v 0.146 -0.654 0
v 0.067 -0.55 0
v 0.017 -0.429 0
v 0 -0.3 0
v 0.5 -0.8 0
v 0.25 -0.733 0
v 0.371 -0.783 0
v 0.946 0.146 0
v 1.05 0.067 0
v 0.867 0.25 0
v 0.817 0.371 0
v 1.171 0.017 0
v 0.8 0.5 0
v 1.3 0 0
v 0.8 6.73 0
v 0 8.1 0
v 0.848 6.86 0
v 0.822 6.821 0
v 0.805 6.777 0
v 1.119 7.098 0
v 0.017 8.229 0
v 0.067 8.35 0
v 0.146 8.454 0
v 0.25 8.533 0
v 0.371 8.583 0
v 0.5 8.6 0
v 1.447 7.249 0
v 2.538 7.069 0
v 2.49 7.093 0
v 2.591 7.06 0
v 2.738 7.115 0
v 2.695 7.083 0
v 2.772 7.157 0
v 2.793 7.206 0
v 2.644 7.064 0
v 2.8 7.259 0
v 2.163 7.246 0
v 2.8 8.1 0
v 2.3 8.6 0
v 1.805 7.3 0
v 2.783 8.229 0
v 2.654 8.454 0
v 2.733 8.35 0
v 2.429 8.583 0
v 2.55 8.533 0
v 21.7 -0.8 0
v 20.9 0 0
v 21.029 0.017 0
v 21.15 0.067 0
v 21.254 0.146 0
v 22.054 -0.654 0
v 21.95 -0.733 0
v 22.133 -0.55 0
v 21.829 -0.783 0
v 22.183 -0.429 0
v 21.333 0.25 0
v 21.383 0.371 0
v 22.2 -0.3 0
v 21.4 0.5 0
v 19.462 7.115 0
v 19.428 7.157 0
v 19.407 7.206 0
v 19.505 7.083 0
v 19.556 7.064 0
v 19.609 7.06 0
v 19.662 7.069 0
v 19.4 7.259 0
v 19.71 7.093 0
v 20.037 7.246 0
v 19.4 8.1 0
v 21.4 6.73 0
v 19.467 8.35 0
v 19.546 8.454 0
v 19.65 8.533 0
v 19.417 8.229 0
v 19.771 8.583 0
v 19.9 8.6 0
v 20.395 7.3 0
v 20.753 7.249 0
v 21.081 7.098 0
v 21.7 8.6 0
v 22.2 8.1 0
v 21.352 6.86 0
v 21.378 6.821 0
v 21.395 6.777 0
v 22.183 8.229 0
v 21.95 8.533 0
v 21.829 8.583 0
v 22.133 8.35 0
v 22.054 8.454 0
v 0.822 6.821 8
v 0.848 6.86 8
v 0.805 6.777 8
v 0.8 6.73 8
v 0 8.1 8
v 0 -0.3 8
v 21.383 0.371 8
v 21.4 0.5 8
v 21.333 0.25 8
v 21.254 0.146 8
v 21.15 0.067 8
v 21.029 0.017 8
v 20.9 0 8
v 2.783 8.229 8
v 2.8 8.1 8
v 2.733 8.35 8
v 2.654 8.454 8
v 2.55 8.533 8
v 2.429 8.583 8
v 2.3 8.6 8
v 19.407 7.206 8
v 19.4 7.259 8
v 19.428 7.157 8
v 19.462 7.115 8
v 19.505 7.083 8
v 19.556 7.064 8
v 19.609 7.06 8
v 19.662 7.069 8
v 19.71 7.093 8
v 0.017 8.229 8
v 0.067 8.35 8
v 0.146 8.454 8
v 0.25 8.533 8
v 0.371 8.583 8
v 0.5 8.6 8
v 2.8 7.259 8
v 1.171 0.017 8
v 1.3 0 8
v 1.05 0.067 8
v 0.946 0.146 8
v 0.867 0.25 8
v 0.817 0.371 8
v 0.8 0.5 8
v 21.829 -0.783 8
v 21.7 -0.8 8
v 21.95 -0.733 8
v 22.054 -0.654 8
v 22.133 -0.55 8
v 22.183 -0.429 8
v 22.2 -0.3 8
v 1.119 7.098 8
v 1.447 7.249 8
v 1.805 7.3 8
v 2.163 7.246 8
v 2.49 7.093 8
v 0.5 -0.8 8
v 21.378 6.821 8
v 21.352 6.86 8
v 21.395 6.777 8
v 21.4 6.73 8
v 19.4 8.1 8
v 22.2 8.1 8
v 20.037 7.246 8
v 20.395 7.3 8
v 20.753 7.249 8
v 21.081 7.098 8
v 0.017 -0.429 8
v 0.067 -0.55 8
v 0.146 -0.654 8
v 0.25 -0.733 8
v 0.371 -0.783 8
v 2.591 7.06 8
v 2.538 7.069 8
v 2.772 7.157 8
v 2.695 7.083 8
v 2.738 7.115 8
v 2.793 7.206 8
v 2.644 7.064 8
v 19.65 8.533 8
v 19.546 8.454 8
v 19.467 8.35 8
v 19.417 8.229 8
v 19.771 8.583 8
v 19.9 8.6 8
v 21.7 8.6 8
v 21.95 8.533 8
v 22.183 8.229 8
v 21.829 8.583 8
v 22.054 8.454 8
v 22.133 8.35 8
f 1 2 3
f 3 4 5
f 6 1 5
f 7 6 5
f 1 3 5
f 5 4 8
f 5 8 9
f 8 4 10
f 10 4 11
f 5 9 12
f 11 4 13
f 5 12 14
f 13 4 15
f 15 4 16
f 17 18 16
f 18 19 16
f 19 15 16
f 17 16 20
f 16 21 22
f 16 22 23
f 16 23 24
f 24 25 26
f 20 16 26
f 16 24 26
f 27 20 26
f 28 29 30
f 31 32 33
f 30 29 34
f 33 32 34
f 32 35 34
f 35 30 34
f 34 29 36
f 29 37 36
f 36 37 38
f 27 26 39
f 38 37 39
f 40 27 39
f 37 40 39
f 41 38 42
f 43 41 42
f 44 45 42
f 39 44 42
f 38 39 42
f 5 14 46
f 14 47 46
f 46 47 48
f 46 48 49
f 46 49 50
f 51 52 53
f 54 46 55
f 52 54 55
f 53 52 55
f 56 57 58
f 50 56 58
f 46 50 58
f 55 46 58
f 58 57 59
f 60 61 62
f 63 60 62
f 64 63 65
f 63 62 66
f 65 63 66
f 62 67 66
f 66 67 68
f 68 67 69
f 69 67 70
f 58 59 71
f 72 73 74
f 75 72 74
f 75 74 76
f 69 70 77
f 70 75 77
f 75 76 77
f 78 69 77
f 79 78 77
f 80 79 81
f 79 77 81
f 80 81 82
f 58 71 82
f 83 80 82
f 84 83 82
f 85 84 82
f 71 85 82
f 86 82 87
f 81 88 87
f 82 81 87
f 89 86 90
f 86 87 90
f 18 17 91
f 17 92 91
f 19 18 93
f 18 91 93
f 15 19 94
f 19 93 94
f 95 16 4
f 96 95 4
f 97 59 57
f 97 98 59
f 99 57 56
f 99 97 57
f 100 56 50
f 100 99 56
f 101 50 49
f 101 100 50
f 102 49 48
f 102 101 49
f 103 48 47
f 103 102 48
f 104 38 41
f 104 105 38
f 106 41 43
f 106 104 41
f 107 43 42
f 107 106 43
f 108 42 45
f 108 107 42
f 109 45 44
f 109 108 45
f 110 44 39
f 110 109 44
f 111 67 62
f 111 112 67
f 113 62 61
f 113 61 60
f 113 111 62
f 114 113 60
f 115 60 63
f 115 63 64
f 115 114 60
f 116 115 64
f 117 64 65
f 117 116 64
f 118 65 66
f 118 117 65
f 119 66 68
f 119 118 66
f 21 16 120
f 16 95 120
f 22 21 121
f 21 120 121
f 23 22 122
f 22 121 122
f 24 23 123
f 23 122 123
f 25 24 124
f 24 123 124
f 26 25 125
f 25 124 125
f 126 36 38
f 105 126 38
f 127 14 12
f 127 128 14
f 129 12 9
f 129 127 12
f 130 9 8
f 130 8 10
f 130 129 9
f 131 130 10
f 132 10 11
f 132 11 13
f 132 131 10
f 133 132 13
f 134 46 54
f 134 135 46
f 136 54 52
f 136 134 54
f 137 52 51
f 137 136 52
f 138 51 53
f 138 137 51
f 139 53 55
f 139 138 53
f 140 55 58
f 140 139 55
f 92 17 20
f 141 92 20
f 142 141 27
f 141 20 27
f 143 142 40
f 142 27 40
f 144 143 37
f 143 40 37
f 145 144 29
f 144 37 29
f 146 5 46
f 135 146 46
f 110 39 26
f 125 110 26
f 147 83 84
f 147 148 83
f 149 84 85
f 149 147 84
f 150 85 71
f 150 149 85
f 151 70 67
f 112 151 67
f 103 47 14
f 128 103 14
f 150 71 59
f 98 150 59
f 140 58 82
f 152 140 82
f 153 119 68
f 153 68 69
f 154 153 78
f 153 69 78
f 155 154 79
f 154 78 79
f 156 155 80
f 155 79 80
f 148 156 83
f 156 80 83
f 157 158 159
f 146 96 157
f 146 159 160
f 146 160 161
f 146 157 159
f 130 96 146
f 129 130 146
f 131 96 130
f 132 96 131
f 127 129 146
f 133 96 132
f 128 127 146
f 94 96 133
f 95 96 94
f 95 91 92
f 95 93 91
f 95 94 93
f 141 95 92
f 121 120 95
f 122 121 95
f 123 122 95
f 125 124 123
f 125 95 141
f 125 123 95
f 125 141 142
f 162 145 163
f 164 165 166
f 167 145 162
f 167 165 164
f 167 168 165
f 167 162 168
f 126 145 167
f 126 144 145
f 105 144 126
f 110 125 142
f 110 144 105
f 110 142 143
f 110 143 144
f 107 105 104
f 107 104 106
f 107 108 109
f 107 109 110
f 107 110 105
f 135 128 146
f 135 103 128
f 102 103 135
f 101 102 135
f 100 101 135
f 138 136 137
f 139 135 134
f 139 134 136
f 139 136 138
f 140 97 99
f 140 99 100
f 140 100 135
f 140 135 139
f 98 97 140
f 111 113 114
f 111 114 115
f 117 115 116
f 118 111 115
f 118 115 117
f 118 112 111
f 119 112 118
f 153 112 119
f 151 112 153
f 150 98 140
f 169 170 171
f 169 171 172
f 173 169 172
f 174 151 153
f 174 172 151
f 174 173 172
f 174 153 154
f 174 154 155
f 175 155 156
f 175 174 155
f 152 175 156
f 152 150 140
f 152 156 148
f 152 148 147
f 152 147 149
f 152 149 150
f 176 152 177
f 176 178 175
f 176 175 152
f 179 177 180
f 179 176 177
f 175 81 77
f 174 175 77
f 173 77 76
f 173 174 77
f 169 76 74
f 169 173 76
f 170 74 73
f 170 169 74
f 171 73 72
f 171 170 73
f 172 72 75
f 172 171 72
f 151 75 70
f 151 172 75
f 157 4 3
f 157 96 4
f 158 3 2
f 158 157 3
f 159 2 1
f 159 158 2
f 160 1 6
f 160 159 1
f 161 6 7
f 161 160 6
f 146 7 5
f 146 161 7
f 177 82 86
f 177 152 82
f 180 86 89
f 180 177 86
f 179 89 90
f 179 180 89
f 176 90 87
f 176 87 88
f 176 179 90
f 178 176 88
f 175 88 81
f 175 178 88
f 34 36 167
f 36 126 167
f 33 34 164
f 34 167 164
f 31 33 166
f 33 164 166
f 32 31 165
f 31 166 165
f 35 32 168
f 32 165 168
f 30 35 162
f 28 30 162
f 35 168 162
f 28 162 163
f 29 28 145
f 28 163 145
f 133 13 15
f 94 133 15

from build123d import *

# Parameters (mm, degrees)
F1_DEPTH = 8
F2_R     = 0.5
F3_R     = 0.2


with BuildPart() as f1:
    # F0 (on Top) → F1 (new body)
    with BuildSketch(Plane.XY):
        Polygon((0, 8.6), (0, 0), (0.8, 0), (0.8, 6.8), (0.8, 8.6), align=None)
        Polygon((0.8, 0), (0, 0), (0, -0.8), (22.2, -0.8), (22.2, 0), (21.4, 0), align=None)
        Polygon((21.4, 6.8), (21.4, 0), (22.2, 0), (22.2, 8.6), (21.4, 8.6), align=None)
        with BuildLine():
            ThreePointArc((19.4, 6.8), (20.4, 7.3), (21.4, 6.8))
            Line((21.4, 6.8), (21.4, 8.6))
            Line((21.4, 8.6), (19.4, 8.6))
            Line((19.4, 8.6), (19.4, 6.8))
        make_face()
        with BuildLine():
            Line((0.8, 8.6), (0.8, 6.8))
            ThreePointArc((0.8, 6.8), (1.8, 7.3), (2.8, 6.8))
            Line((2.8, 6.8), (2.8, 8.6))
            Line((2.8, 8.6), (0.8, 8.6))
        make_face()
    extrude(amount=F1_DEPTH)

    # F2
    f2_edges = [f1.edges().sort_by_distance(p)[0] for p in [
        (22.2, -0.8, 4),
        (0, -0.8, 4),
        (22.2, 8.6, 4),
        (19.4, 8.6, 4),
        (0, 8.6, 4),
        (2.8, 8.6, 4),
        (0.8, 0, 4),
        (21.4, 0, 4),
    ]]
    fillet(f2_edges, radius=F2_R)

    # F3
    f3_edges = [f1.edges().sort_by_distance(p)[0] for p in [
        (2.8, 6.8, 4),
        (0.8, 6.8, 4),
        (19.4, 6.8, 4),
        (21.4, 6.8, 4),
    ]]
    fillet(f3_edges, radius=F3_R)


solid = f1.part
